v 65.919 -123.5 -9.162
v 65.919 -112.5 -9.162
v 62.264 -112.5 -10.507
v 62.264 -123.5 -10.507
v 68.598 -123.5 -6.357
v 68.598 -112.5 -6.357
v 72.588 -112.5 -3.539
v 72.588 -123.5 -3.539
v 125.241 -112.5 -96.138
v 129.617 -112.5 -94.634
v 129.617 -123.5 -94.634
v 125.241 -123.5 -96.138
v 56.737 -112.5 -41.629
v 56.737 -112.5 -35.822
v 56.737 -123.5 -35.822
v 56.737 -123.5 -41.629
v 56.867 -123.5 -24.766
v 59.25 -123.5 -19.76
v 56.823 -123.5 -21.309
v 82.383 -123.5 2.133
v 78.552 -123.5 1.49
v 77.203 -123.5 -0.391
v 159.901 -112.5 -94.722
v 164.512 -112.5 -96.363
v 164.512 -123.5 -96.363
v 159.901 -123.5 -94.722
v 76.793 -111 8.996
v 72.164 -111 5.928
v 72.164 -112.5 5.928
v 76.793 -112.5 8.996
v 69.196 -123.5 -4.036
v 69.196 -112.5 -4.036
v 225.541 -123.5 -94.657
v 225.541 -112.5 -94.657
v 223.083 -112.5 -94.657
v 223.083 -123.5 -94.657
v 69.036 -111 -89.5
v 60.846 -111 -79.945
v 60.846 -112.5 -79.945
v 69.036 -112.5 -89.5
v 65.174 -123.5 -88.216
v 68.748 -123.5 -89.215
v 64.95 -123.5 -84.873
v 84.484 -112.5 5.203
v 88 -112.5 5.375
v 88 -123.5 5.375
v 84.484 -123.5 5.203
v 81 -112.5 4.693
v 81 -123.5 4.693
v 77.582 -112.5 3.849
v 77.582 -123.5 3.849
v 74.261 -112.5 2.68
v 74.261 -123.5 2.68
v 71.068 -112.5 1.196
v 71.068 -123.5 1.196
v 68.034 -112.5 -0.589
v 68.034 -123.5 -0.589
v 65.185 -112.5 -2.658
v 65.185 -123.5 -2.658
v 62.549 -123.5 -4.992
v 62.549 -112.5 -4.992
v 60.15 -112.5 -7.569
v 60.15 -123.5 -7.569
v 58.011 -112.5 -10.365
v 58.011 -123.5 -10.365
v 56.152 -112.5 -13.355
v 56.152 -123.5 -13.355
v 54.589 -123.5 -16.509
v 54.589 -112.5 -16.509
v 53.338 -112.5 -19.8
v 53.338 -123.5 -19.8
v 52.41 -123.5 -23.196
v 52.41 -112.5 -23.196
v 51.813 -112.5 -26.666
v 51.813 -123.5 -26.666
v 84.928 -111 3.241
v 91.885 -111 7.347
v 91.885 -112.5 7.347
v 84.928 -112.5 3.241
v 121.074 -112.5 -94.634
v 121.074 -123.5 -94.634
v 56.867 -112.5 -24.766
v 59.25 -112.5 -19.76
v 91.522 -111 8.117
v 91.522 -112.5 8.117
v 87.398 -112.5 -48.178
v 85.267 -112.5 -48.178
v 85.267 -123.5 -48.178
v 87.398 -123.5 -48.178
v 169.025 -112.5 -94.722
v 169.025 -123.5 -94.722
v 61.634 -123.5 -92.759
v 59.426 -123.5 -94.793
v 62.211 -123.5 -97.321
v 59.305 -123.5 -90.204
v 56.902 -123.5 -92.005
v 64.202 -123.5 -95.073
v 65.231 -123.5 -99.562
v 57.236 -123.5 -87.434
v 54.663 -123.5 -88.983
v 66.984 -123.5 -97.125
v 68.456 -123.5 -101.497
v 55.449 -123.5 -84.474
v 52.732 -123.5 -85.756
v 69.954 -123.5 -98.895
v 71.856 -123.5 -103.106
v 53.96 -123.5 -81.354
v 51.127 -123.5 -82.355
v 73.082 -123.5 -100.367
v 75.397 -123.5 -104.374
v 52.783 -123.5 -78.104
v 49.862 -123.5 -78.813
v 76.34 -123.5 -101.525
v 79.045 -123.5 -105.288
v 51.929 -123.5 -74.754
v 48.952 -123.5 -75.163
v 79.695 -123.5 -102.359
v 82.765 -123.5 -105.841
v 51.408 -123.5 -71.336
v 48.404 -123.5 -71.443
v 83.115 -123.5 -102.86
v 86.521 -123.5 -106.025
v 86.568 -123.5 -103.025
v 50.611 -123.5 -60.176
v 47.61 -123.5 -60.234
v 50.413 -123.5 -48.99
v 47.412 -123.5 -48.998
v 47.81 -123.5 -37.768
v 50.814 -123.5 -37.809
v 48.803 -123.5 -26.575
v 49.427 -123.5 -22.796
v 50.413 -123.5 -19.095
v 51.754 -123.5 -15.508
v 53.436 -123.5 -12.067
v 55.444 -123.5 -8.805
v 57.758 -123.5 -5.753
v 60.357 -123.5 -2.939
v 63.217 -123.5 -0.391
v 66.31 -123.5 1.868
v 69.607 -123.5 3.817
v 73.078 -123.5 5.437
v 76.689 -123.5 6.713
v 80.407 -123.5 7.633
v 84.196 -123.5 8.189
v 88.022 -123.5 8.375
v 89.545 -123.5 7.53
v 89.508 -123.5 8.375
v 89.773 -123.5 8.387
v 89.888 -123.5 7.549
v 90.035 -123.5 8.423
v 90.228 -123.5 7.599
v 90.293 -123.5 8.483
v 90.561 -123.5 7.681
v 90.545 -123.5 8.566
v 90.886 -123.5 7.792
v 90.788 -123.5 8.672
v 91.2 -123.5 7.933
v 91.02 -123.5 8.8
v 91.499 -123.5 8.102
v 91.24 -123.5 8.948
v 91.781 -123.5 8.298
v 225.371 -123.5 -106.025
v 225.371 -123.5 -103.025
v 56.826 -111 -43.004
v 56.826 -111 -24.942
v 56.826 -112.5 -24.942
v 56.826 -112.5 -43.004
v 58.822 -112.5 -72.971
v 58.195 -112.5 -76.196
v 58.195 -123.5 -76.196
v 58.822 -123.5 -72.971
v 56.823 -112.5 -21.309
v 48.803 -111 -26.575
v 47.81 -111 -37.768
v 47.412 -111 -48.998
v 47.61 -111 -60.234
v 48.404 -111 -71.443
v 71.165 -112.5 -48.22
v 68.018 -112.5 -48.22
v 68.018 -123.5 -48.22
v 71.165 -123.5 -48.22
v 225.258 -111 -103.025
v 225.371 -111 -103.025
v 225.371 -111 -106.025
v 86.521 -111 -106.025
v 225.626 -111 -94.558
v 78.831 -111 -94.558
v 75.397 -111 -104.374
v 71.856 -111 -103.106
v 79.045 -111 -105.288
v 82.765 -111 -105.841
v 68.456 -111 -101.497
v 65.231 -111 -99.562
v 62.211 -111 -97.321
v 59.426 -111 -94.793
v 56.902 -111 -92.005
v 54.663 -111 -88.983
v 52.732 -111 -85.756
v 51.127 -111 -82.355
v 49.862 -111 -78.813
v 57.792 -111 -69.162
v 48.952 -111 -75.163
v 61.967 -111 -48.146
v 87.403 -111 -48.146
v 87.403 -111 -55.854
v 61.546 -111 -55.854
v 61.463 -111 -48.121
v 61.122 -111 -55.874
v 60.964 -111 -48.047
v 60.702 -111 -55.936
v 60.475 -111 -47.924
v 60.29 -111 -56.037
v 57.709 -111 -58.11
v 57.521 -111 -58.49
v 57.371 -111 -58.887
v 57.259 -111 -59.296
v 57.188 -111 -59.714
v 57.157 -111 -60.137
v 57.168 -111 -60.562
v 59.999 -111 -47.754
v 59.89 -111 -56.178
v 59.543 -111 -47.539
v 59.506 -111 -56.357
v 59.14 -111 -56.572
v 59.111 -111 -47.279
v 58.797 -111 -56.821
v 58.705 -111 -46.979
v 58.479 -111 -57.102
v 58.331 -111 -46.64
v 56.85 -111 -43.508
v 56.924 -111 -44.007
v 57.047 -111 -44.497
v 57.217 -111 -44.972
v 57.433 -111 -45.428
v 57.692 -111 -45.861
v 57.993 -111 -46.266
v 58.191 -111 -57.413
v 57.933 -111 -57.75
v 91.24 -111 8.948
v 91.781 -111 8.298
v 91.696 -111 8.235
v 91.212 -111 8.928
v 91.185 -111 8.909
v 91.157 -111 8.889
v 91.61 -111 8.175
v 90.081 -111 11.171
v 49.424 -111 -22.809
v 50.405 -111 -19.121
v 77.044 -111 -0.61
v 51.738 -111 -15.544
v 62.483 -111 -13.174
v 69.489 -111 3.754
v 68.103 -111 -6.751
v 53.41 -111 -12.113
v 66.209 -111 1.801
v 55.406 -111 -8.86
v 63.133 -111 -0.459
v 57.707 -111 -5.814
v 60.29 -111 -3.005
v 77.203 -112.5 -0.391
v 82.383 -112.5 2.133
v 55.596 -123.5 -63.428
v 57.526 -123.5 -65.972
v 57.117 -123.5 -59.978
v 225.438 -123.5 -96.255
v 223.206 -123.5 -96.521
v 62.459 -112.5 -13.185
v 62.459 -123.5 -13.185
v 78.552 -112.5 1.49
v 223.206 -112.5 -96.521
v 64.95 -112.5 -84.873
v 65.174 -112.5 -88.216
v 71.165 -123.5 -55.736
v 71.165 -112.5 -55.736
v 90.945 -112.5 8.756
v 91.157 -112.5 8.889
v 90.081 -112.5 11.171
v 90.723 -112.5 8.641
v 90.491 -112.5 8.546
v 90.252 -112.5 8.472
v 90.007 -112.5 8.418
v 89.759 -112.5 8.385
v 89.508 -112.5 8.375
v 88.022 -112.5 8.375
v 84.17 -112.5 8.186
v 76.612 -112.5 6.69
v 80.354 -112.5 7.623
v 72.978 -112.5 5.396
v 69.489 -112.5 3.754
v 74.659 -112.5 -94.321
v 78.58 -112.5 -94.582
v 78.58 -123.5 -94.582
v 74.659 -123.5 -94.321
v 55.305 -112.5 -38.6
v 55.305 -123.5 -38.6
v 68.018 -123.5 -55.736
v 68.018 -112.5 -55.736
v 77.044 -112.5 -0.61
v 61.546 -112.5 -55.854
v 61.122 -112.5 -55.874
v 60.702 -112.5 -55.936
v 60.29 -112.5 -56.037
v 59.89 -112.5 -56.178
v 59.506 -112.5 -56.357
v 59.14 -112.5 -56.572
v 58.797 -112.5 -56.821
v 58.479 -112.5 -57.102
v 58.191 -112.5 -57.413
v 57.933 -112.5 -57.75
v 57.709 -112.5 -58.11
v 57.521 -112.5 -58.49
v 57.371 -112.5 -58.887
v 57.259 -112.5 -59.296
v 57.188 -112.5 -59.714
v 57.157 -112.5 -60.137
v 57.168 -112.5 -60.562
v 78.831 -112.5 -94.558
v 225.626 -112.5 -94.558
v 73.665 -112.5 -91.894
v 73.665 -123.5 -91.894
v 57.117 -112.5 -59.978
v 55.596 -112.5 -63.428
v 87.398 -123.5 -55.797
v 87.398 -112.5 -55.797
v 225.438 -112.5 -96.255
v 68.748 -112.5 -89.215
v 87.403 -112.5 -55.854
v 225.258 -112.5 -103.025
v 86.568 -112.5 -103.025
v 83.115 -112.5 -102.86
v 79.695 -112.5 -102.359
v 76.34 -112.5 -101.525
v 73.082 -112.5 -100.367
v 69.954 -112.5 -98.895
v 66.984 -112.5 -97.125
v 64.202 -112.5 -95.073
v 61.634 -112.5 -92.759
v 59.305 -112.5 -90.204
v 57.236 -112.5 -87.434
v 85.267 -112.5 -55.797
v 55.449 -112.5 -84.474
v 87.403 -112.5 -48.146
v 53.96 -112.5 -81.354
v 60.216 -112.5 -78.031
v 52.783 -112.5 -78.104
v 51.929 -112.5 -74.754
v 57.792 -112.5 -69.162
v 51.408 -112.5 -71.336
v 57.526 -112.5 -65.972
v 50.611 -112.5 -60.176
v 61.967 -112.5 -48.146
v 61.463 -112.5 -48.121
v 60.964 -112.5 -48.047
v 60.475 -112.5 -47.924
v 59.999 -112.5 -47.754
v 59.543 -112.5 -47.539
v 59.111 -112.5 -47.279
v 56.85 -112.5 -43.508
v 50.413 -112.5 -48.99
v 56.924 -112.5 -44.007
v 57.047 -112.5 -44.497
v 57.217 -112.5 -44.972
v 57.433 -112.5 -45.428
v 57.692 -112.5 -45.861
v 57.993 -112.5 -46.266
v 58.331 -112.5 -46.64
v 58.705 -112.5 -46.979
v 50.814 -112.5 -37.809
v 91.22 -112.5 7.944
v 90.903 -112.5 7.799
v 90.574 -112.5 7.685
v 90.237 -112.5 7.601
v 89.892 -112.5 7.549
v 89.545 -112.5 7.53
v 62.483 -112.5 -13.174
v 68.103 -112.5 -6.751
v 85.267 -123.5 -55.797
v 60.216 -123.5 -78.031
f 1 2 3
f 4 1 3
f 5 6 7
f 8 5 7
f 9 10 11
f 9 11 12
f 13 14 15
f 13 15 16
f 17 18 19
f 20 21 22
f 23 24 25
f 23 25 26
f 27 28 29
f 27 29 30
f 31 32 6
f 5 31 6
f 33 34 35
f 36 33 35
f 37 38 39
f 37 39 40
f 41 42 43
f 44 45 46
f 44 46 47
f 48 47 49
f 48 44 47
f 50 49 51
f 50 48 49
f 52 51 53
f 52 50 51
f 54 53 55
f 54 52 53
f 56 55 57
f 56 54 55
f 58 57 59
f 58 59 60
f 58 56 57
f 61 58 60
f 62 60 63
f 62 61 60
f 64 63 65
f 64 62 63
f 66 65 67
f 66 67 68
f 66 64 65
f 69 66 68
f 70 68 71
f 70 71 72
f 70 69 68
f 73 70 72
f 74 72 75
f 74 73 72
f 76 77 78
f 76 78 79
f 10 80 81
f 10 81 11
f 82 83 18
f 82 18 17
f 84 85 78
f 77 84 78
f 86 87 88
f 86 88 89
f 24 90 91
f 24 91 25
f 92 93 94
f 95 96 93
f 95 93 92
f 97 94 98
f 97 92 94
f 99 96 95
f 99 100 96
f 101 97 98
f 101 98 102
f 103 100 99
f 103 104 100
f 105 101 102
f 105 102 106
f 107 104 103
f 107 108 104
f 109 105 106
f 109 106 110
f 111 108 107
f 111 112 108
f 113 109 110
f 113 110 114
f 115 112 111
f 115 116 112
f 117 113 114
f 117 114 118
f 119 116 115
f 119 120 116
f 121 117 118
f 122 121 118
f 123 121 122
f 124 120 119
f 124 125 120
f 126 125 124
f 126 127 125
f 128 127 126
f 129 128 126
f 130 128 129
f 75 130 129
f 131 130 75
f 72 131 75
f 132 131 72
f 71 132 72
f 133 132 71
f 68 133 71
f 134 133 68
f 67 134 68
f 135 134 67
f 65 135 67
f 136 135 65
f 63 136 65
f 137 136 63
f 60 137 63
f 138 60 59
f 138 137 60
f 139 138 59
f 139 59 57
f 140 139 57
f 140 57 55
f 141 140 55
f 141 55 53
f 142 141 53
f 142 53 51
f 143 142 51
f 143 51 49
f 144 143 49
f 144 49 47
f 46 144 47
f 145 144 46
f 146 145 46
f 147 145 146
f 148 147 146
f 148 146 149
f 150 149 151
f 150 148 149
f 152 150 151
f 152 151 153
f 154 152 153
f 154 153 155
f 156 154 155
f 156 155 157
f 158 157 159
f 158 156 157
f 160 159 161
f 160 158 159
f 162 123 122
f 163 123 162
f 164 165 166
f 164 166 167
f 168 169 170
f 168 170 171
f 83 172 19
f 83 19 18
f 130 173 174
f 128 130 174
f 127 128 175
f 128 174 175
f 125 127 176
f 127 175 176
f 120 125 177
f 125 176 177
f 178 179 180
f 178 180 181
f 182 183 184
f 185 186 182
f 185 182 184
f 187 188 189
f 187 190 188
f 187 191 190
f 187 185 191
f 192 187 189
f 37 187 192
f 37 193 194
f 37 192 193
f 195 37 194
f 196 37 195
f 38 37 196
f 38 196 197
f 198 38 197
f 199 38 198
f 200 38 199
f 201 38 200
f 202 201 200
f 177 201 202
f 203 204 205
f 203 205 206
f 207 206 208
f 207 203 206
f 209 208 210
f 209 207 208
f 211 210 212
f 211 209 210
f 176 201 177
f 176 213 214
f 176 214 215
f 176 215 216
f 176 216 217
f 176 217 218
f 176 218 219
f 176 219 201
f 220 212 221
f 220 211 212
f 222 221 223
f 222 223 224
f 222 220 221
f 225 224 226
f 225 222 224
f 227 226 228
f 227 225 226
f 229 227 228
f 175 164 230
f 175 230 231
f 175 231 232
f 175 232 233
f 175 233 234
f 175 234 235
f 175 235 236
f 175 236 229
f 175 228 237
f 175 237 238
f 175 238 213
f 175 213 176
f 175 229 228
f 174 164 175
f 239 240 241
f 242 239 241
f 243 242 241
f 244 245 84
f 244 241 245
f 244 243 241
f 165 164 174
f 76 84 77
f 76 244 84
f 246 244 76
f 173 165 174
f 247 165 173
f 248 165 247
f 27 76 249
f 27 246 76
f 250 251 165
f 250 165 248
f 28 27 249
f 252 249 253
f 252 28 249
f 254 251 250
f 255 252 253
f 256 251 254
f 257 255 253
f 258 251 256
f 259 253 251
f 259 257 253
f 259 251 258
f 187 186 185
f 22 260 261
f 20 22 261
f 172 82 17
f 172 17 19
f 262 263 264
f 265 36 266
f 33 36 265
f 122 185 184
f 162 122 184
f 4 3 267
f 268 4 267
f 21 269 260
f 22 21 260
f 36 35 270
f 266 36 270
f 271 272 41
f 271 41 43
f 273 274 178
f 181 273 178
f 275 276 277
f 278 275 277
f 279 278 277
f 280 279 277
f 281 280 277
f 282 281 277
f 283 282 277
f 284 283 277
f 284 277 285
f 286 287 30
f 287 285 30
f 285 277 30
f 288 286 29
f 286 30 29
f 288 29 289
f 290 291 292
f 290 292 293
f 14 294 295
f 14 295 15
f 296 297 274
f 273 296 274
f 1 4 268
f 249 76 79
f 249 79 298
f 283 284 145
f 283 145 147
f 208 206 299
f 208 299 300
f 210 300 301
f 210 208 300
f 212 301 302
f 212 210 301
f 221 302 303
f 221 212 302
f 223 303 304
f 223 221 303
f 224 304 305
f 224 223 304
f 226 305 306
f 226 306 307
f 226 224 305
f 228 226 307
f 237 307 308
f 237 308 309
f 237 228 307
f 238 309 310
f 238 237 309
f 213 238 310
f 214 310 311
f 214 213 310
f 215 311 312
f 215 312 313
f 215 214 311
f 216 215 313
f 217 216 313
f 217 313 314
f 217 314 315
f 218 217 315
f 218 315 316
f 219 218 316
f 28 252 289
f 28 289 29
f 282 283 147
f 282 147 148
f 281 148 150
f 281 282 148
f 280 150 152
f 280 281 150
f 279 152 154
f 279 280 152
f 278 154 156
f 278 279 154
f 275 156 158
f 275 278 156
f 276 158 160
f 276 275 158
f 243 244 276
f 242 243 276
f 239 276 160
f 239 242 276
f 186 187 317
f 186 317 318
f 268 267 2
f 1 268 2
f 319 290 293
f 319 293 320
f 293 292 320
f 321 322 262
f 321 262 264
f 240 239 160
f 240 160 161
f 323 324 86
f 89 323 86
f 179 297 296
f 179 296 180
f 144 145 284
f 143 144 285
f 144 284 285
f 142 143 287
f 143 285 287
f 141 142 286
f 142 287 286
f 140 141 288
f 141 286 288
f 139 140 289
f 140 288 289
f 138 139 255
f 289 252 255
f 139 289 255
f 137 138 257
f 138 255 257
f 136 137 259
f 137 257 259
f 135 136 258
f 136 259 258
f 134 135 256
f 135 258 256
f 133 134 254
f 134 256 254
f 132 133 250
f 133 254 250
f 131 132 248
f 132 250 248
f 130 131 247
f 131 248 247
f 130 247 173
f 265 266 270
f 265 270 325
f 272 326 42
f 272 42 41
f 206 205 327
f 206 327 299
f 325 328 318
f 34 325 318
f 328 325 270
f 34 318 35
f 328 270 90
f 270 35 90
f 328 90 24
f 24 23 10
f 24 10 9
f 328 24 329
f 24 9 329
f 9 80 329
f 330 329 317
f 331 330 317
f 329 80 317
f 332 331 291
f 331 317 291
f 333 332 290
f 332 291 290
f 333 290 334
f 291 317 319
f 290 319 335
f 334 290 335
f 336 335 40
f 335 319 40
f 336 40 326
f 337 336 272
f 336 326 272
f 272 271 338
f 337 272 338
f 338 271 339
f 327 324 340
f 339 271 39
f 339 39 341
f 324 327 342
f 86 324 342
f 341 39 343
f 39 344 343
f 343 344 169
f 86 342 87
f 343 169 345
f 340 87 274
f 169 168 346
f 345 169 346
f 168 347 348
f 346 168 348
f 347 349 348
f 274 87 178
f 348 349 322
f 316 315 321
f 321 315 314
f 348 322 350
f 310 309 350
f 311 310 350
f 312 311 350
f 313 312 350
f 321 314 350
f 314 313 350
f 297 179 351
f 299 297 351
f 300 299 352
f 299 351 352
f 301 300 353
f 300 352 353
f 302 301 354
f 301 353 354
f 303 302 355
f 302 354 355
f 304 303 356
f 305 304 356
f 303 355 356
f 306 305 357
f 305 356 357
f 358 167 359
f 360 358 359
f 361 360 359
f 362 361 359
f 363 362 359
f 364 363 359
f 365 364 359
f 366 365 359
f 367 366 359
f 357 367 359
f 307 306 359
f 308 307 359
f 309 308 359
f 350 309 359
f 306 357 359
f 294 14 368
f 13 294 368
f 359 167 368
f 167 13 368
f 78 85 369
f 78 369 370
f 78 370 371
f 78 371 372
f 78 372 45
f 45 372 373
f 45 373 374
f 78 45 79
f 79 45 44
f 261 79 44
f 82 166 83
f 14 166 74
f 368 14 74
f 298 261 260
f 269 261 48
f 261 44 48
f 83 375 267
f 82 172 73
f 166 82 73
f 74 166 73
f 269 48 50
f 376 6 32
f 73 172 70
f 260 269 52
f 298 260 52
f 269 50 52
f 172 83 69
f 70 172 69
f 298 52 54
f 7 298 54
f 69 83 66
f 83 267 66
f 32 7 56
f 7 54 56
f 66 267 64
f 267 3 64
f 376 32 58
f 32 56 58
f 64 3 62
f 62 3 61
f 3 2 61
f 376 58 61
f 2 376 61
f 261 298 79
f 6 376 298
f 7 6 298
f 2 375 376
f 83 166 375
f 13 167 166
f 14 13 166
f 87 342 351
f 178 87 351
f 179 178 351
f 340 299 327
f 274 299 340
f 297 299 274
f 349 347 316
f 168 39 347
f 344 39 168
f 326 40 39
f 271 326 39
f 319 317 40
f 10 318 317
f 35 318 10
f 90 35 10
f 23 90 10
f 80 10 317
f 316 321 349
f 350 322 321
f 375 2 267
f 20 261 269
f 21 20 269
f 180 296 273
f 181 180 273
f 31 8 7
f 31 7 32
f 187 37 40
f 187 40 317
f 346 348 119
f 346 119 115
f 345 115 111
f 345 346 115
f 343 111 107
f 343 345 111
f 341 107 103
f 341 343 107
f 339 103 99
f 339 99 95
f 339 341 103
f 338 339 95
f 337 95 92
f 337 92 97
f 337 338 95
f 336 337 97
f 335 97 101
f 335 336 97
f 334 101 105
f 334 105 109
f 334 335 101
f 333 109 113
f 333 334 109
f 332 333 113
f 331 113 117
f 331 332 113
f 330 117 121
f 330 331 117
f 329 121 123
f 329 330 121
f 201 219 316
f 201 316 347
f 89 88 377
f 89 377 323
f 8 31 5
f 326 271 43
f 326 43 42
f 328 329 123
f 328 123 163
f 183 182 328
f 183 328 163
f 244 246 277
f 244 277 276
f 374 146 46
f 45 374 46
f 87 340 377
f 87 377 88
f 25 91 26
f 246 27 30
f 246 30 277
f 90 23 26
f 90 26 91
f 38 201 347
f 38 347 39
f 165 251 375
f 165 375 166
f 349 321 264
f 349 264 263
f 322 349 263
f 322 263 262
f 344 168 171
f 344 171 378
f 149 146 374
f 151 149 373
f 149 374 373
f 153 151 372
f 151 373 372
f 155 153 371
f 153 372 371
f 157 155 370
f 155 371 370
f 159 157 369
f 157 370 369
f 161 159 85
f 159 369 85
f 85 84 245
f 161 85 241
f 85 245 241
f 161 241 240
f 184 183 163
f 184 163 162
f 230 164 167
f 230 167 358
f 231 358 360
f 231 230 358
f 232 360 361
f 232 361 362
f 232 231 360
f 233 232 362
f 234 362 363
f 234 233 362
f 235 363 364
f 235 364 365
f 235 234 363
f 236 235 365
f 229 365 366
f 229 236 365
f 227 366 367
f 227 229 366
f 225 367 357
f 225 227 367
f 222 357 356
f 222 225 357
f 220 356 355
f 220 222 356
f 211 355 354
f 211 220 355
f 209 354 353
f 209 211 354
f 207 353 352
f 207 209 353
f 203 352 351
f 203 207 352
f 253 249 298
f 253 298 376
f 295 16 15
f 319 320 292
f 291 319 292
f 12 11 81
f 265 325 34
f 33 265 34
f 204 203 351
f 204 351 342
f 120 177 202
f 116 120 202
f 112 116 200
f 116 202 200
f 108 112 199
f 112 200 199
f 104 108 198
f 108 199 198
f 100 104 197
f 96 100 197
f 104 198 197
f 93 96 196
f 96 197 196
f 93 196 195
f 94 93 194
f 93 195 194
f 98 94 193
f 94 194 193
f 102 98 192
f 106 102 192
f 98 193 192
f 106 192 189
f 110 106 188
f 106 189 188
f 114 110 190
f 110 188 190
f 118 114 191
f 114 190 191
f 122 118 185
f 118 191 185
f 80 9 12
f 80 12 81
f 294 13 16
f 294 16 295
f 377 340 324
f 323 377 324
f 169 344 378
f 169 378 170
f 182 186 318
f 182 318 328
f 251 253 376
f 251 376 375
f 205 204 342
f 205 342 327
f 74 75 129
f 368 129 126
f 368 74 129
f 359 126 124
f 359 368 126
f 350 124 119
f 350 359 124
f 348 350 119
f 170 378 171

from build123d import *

# Parameters (mm, degrees)
PAD356_DEPTH  = 12.5
PAD357_DEPTH  = 1.5
SKETCH835_W   = 2.131072
SKETCH835_H   = 7.619457
SKETCH835_W_2 = 3.147286
SKETCH835_H_2 = 7.516819
PAD359_DEPTH  = 11


with BuildPart() as part:
    # Sketch830 → Pad356 (new body)
    with BuildSketch(Plane.XZ):
        with BuildLine():
            Line((-1.478534, -110.025169), (137.370667, -110.025169))
            Line((137.370667, -107.025169), (137.370667, -110.025169))
            Line((-1.431571, -107.025169), (137.370667, -107.025169))
            ThreePointArc((-36.592097, -75.335952), (-25.110465, -97.94725), (-1.431571, -107.025169))
            ThreePointArc((-36.186878, -30.666211), (-37.587109, -52.990217), (-36.592097, -75.335952))
            ThreePointArc((0, 1.374966), (-24.161208, -7.792765), (-36.186878, -30.666211))
            Line((1.544739, 3.529825), (0, 1.374966))
            ThreePointArc((1.544739, 3.529825), (2.72516, 3.732882), (3.781105, 4.298219))
            Line((3.239563, 4.948117), (3.781105, 4.298219))
            ThreePointArc((1.508208, 4.37461), (2.420143, 4.521718), (3.239563, 4.948117))
            Line((0.022068, 4.37461), (1.508208, 4.37461))
            ThreePointArc((0.022068, 4.37461), (-26.243945, -5.630658), (-39.196845, -30.575221))
            ThreePointArc((-39.196845, -30.575221), (-40.587676, -52.998313), (-39.596378, -75.442618))
            ThreePointArc((-39.596378, -75.442618), (-27.212376, -100.091175), (-1.478534, -110.025169))
        make_face()
    extrude(amount=PAD356_DEPTH)

    # Sketch831 → Pad357 (join)
    with BuildSketch(Plane.XZ):
        with BuildLine():
            Line((-11.20697, 4.995917), (2.081055, 7.171183))
            Line((2.081055, 7.171183), (3.884949, 3.346928))
            Line((3.884949, 3.346928), (-3.071976, -0.758803))
            Line((-3.071976, -0.758803), (-10.956131, -4.609589))
            Line((-10.956131, -4.609589), (-19.896614, -10.750674))
            Line((-19.896614, -10.750674), (-25.51712, -17.174105))
            Line((-25.51712, -17.174105), (-31.174488, -28.94161))
            Line((-31.174488, -28.94161), (-31.174488, -40.845127))
            Line((-31.174488, -40.845127), (-31.174488, -47.004086))
            ThreePointArc((-31.174488, -47.004086), (-29.668559, -50.63972), (-26.032925, -52.145649))
            Line((-26.032925, -52.145649), (-0.596695, -52.145649))
            Line((-0.596695, -52.145649), (-0.596695, -59.85376))
            Line((-0.596695, -59.85376), (-26.454301, -59.85376))
            ThreePointArc((-26.454301, -59.85376), (-29.668775, -61.254046), (-30.832452, -64.561539))
            Line((-30.832452, -64.561539), (-30.207592, -73.162094))
            Line((-30.207592, -73.162094), (-27.154285, -83.944923))
            Line((-27.154285, -83.944923), (-18.964409, -93.499779))
            Line((-18.964409, -93.499779), (-9.168678, -98.558228))
            Line((-9.168678, -98.558228), (-2.331345, -98.558228))
            Line((-2.331345, -98.558228), (137.626465, -98.558228))
            Line((137.626465, -98.558228), (137.14772, -109.564461))
            Line((137.14772, -109.564461), (2.745987, -109.564461))
            Line((2.745987, -109.564461), (-3.35627, -109.564461))
            Line((-3.35627, -109.564461), (-8.527748, -108.903885))
            Line((-8.527748, -108.903885), (-14.660988, -106.811363))
            Line((-14.660988, -106.811363), (-18.737785, -105.296097))
            Line((-18.737785, -105.296097), (-23.031059, -102.842796))
            Line((-23.031059, -102.842796), (-25.966358, -100.308403))
            Line((-25.966358, -100.308403), (-29.71846, -96.772774))
            Line((-29.71846, -96.772774), (-33.867416, -91.108543))
            Line((-33.867416, -91.108543), (-35.409092, -87.704582))
            Line((-35.409092, -87.704582), (-37.577, -82.887016))
            Line((-37.577, -82.887016), (-39.02227, -76.142418))
            Line((-39.02227, -76.142418), (-39.504028, -68.916061))
            Line((-39.504028, -68.916061), (-39.795753, -62.945045))
            Line((-39.795753, -62.945045), (-39.795753, -54.118259))
            Line((-39.795753, -54.118259), (-39.795753, -44.679527))
            Line((-39.795753, -44.679527), (-38.558964, -32.354319))
            Line((-38.558964, -32.354319), (-38.395519, -29.4237))
            Line((-38.395519, -29.4237), (-36.619396, -22.319212))
            Line((-36.619396, -22.319212), (-33.174793, -14.730327))
            Line((-33.174793, -14.730327), (-28.806725, -8.890129))
            Line((-28.806725, -8.890129), (-22.724854, -3.669405))
            Line((-22.724854, -3.669405), (-15.835655, 1.92807))
            Line((-15.835655, 1.92807), (-11.20697, 4.995917))
        make_face()
    extrude(amount=PAD357_DEPTH)

    # Sketch835 → Pad359 (join)
    with BuildSketch(Plane.XZ.offset(1.5)):
        Polygon((-10.797218, -4.39096), (-5.61734, -1.866684), (-9.447662, -2.509944), align=None)
        Polygon((-19.402313, -10.356634), (-15.412445, -7.539076), (-18.804184, -8.036141), align=None)
        Polygon((-25.540901, -17.185297), (-22.080704, -13.161652), (-25.735592, -14.506651), align=None)
        Polygon((-28.749714, -23.759703), (-31.132679, -28.766081), (-31.176563, -25.309376), align=None)
        Polygon((-31.262688, -39.822292), (-31.262688, -45.629166), (-32.695404, -42.60001), align=None)
        with Locations((-1.667923, -55.987685)):
            Rectangle(SKETCH835_W, SKETCH835_H)
        with Locations((-18.408268, -55.977922)):
            Rectangle(SKETCH835_W_2, SKETCH835_H_2)
        Polygon((-30.88335, -63.977547), (-30.474003, -69.971565), (-32.403786, -67.427757), align=None)
        Polygon((-29.178089, -76.970978), (-27.78371, -82.030663), (-29.80479, -80.196259), align=None)
        Polygon((-23.049667, -88.872955), (-19.251656, -93.215378), (-22.826111, -92.215782), align=None)
        Polygon((-14.334663, -95.893806), (-9.420021, -98.582397), (-13.340538, -98.320648), align=None)
        Polygon((33.074181, -98.633934), (41.61673, -98.633934), (37.240623, -100.138222), align=None)
        Polygon((71.901031, -98.722458), (81.025146, -98.722458), (76.512283, -100.363495), align=None)
        Polygon((135.082978, -98.65696), (135.205872, -100.520859), (137.438461, -100.254593), (137.540878, -98.656967), align=None)
    extrude(amount=PAD359_DEPTH)


with BuildPart() as part_1:
    # Body024 placement: moved
    add(part.part.moved(Location((88, -111, 4))))


solid = part_1.part
